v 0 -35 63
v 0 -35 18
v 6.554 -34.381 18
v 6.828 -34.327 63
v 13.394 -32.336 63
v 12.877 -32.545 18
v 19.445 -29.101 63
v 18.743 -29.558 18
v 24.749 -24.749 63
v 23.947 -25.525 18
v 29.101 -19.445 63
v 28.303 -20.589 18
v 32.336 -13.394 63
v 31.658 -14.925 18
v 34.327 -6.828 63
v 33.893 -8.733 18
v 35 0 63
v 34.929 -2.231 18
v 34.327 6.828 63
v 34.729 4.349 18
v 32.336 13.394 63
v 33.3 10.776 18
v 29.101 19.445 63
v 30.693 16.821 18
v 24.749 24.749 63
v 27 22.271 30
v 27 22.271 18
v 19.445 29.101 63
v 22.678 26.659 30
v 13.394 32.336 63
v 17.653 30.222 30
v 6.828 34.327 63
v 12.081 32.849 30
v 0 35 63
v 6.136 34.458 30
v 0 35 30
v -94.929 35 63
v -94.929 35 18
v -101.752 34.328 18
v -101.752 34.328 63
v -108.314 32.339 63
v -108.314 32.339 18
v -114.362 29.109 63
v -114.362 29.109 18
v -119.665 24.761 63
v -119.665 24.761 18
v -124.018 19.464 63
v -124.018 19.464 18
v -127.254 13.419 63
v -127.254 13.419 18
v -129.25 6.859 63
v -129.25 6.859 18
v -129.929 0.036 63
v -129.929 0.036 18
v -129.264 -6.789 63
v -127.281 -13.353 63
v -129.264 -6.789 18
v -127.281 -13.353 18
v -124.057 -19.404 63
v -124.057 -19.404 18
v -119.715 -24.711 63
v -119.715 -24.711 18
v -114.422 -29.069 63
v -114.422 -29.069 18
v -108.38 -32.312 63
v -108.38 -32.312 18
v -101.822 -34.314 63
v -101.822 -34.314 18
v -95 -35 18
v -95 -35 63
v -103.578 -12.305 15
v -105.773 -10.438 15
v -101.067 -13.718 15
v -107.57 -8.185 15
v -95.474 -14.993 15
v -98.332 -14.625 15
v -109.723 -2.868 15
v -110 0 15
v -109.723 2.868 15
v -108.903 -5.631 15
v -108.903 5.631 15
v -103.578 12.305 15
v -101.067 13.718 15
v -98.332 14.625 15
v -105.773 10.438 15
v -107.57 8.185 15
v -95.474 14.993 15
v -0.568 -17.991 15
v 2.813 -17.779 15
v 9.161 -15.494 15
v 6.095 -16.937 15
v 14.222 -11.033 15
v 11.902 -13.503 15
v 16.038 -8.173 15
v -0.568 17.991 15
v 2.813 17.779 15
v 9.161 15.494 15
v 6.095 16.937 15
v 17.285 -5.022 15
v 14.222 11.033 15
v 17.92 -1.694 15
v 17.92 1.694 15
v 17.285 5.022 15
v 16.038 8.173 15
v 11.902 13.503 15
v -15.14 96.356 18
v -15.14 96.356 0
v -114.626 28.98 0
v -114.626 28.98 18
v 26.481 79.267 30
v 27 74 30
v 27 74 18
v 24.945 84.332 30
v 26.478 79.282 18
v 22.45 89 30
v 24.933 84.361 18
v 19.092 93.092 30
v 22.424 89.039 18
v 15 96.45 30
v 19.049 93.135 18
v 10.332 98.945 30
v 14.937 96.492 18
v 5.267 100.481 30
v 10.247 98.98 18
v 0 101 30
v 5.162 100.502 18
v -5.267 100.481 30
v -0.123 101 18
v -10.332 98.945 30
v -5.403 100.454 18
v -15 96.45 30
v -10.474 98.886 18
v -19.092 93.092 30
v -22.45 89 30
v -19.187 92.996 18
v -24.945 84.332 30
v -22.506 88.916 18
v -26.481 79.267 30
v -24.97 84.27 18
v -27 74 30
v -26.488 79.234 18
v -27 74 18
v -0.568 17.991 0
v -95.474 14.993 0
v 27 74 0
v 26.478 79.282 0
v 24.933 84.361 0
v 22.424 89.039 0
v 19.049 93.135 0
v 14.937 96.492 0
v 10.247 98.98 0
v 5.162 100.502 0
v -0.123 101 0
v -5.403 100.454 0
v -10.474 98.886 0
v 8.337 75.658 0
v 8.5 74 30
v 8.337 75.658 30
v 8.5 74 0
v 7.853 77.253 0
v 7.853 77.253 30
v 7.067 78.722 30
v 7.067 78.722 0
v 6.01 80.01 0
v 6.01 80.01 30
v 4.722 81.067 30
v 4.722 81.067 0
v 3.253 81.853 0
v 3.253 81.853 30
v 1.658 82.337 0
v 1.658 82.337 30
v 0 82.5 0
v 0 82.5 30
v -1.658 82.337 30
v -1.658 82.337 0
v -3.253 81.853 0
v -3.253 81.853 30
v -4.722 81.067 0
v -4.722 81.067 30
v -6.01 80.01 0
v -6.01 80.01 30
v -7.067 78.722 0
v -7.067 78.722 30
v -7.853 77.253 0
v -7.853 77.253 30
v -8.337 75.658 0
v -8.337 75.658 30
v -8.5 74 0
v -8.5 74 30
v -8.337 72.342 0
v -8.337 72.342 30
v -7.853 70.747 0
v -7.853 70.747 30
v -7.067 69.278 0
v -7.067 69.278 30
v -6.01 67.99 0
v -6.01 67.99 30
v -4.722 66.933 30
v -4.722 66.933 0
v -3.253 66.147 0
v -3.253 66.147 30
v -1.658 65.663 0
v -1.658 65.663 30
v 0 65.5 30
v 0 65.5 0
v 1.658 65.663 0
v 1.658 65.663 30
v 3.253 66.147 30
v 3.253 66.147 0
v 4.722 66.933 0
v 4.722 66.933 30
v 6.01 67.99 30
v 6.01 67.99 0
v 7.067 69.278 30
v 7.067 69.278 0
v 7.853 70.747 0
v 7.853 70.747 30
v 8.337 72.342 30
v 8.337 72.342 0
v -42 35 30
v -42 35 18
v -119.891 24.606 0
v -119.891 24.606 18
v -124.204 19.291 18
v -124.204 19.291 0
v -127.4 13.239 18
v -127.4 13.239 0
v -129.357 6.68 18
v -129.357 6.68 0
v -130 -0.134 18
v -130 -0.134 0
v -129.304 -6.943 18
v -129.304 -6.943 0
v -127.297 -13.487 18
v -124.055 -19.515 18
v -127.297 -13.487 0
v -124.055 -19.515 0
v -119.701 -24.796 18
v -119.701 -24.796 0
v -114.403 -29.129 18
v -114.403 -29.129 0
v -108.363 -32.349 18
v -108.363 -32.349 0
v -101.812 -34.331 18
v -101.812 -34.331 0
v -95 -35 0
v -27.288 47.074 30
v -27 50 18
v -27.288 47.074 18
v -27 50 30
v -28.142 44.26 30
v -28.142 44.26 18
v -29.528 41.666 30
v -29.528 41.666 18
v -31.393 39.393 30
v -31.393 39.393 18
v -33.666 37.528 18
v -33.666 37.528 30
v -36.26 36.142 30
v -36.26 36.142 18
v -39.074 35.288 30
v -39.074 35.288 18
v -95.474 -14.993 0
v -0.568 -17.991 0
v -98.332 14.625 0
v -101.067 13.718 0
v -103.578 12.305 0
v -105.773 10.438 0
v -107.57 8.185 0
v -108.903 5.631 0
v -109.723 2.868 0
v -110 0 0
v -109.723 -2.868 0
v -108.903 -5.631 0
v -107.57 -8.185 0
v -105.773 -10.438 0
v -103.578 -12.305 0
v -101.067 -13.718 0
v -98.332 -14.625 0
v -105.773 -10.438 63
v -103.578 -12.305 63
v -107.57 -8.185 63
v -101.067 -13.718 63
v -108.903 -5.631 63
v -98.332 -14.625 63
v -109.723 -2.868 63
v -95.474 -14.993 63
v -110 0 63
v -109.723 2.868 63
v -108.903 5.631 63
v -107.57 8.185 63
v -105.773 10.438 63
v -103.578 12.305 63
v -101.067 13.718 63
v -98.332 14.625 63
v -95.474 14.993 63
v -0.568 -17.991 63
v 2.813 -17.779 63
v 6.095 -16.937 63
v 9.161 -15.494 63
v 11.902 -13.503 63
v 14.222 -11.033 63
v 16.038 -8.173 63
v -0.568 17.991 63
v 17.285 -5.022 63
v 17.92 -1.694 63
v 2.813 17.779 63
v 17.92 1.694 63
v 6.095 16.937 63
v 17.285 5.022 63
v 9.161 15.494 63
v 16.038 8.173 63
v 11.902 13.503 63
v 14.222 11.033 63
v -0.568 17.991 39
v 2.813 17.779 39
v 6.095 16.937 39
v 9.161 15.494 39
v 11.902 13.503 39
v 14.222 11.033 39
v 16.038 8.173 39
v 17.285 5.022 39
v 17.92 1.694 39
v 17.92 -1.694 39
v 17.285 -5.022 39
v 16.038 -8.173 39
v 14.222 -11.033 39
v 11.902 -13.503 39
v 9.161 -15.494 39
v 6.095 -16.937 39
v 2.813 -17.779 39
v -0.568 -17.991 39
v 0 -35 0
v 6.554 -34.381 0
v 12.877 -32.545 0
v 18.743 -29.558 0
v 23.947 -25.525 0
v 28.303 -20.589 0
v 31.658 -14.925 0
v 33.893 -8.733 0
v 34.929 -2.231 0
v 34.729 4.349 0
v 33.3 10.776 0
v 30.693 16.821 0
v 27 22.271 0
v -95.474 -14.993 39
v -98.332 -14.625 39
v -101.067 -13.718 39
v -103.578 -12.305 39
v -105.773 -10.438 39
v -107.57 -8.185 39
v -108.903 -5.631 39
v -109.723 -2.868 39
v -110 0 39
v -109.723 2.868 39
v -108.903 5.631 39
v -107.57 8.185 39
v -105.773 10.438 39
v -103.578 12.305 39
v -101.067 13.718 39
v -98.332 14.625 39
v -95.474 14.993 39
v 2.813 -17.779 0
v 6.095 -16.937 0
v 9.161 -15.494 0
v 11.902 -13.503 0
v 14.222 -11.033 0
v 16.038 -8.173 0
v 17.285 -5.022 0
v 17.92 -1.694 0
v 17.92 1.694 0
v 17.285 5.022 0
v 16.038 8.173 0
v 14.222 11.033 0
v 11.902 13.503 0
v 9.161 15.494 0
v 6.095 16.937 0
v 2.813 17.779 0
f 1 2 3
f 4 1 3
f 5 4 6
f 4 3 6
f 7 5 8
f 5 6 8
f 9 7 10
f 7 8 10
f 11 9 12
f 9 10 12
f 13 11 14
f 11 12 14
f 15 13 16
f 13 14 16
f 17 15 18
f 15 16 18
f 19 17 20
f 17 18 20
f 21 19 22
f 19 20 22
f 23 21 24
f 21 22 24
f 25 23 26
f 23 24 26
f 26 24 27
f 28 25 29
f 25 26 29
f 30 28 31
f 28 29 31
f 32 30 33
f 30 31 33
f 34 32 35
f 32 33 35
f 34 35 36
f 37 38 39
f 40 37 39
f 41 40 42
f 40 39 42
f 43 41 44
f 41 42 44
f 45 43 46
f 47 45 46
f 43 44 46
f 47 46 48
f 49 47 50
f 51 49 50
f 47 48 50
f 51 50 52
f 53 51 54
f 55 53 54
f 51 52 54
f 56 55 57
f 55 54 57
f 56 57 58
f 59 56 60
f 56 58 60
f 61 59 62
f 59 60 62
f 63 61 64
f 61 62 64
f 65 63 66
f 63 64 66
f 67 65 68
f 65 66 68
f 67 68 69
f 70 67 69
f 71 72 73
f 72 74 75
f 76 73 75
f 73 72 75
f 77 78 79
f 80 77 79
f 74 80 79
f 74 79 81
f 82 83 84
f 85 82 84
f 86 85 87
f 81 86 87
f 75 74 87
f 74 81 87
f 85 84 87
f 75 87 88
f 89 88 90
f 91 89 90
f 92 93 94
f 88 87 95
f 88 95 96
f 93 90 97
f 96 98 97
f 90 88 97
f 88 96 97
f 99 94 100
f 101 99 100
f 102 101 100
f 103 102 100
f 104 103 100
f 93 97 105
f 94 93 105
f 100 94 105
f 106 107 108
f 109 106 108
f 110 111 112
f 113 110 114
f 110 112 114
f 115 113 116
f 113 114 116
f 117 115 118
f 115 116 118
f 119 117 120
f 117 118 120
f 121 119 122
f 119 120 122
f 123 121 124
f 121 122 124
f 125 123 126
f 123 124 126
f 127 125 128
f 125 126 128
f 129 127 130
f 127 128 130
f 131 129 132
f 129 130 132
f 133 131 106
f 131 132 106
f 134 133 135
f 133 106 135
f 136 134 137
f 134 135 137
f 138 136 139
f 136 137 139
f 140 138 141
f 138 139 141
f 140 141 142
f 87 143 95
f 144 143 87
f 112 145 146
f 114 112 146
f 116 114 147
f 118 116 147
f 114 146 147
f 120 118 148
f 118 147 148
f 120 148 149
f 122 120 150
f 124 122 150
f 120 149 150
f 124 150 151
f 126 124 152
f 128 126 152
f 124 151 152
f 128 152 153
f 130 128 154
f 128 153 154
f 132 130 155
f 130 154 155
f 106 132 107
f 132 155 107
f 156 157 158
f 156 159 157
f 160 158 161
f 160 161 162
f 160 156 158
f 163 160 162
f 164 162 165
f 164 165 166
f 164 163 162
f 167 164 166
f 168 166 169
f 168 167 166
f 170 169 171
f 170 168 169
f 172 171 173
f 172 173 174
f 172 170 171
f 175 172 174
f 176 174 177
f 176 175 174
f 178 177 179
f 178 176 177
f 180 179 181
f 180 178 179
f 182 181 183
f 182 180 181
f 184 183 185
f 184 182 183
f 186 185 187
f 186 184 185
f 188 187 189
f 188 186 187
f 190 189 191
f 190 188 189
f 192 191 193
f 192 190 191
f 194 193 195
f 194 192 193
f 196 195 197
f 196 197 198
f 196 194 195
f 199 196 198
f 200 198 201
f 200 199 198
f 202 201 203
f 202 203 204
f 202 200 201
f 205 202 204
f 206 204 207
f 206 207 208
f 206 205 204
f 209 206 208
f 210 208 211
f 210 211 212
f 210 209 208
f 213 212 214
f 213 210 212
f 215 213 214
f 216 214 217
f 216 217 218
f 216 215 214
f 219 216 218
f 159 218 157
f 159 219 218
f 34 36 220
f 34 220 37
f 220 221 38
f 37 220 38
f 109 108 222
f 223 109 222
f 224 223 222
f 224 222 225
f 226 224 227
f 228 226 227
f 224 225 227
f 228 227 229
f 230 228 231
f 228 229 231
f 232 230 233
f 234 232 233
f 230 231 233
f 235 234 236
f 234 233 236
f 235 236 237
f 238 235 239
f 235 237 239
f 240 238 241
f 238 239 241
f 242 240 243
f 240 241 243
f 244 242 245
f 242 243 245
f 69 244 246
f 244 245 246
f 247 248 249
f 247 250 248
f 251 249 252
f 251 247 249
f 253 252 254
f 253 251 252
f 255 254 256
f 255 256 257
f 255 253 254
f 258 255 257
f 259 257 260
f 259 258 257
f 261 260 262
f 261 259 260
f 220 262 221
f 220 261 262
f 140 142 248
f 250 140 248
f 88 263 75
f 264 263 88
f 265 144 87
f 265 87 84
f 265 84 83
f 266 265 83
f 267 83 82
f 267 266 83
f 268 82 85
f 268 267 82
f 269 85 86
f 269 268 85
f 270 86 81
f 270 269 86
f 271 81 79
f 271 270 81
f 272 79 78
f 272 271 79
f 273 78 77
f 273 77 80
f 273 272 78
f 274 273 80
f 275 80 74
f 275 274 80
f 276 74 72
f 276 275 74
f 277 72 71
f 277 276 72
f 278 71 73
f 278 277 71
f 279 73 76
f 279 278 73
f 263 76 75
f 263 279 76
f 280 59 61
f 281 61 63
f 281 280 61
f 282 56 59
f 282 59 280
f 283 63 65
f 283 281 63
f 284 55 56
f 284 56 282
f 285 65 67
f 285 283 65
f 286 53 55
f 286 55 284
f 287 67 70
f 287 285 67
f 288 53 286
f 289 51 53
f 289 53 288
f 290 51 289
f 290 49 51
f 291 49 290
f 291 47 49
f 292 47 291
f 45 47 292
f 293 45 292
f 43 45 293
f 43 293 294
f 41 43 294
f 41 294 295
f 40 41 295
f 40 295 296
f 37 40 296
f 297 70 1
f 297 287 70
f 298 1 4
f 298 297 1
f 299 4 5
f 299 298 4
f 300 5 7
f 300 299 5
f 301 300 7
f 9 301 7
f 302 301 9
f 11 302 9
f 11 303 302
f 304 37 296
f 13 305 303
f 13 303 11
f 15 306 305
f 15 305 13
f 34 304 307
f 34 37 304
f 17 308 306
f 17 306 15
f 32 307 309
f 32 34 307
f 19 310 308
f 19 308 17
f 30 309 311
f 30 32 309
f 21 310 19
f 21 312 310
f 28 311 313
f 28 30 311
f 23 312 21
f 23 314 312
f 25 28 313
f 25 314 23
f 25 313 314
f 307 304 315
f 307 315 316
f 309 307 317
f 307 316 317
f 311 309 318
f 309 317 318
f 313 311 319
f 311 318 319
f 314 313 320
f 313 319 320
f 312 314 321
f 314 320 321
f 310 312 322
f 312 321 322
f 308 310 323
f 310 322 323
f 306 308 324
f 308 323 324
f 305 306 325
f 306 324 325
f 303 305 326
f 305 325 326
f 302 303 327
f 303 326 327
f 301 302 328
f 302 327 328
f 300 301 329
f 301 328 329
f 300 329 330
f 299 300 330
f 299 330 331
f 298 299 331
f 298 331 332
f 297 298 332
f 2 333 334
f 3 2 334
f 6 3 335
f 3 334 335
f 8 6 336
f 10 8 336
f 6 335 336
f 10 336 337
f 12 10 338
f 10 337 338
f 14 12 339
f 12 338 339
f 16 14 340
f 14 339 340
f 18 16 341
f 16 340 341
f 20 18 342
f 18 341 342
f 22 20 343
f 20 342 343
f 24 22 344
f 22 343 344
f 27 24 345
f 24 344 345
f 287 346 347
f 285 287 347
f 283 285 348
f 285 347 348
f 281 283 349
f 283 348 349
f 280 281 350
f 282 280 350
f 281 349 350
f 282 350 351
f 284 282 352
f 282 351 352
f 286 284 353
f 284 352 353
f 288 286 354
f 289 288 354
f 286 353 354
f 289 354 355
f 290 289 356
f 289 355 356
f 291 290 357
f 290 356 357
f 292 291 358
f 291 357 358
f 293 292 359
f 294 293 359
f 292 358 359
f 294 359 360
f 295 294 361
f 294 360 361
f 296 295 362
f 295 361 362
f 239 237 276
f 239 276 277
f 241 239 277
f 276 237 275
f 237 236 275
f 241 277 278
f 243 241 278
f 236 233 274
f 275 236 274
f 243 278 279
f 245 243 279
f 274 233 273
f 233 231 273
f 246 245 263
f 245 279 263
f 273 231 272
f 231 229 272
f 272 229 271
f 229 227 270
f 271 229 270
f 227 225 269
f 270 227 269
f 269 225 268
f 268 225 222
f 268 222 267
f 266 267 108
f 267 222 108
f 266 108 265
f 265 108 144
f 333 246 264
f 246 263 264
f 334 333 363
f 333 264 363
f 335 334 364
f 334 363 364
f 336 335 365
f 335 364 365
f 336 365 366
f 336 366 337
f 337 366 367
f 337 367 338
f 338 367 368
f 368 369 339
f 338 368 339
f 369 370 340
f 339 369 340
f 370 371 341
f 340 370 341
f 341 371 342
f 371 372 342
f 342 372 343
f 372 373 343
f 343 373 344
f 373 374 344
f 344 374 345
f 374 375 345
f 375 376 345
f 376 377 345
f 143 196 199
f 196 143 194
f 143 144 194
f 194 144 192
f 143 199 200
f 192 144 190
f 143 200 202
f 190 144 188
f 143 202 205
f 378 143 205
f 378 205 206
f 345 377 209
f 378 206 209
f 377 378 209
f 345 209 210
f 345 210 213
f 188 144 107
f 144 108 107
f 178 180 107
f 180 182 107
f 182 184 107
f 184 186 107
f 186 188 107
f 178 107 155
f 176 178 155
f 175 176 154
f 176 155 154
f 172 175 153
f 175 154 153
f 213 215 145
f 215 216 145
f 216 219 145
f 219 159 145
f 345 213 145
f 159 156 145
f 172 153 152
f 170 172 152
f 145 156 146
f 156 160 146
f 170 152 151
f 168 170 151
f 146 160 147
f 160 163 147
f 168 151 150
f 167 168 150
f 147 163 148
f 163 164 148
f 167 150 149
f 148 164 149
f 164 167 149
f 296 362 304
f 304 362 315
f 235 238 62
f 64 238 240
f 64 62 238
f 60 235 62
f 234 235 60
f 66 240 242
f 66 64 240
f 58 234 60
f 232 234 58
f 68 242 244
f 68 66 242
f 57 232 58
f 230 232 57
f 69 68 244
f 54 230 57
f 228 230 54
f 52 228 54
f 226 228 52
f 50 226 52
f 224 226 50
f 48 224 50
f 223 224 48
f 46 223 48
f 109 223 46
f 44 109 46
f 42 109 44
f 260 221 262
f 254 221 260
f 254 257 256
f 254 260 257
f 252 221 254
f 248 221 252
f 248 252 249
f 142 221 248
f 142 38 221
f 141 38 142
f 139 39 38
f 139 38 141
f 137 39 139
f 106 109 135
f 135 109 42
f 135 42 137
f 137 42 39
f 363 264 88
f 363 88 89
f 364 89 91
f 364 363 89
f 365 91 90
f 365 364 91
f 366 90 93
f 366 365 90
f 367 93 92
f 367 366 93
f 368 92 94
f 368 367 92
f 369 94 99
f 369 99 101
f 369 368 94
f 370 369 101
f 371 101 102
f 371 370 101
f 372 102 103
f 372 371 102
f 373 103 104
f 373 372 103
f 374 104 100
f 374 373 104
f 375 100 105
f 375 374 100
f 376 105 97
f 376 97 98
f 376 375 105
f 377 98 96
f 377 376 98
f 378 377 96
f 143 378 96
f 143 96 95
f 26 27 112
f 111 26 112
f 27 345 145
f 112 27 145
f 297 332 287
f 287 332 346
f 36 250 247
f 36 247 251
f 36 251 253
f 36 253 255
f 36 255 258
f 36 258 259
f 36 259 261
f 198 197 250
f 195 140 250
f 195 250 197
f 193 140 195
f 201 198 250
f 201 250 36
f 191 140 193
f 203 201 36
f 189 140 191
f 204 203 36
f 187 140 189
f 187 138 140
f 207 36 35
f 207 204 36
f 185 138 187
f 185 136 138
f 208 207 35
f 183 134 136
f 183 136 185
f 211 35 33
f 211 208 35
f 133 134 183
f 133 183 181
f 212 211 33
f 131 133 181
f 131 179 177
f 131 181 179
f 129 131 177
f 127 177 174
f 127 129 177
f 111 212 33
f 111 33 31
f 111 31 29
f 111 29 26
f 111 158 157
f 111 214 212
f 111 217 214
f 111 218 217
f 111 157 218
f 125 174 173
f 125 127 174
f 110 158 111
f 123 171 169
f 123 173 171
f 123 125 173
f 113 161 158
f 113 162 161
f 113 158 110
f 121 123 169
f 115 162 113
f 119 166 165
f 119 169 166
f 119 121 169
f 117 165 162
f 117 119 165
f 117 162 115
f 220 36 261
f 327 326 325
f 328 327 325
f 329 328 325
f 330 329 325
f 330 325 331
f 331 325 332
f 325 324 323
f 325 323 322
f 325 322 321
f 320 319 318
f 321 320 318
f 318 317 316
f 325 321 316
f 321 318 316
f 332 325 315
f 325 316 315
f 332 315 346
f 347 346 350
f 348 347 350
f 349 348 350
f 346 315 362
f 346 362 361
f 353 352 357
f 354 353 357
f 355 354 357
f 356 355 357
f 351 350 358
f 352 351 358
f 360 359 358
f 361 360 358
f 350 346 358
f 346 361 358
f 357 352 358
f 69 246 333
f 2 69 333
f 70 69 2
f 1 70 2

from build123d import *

# Parameters (mm, degrees)
SKETCH1_R           = 8.5
BASE_DEPTH          = 18
BACK_CUT_DEPTH      = 15
BOSS_EXTRUDE2_DEPTH = 45
SKETCH5_R           = 8.5
BOSS_EXTRUDE4_DEPTH = 12
FILLET1_R           = 15
CUT_EXTRUDE2_START  = -24
CUT_EXTRUDE2_DEPTH  = 24


# Read off the part's stored shape, not the designer's step: Boss-Extrude2
with BuildPart() as part:
    # Sketch1 → base (new body)
    with BuildSketch(Plane.XY):
        with BuildLine():
            Line((-95, -35), (0, -35))
            ThreePointArc((0, -35), (31.658229663, -14.925029132), (27, 22.271057451))
            Line((27, 22.271057451), (27, 74))
            ThreePointArc((27, 74), (12.653359163, 97.8514675), (-15.140185324, 96.355643322))
            Line((-15.140185324, 96.355643322), (-114.626166161, 28.97953764))
            ThreePointArc((-114.626166161, 28.97953764), (-128.461050621, -10.26440896), (-95, -35))
        make_face()
        with Locations((0, 74)):
            Circle(SKETCH1_R, mode=Mode.SUBTRACT)
    extrude(amount=BASE_DEPTH)

    # Sketch3 → back cut (cut)
    with BuildSketch(Plane(origin=(0, 0, 0), x_dir=(-1, 0, 0), z_dir=(0, 0, -1))):
        with BuildLine():
            Line((0.568421053, 17.991022692), (95.473684211, 14.99251891))
            ThreePointArc((95.473684211, 14.99251891), (110, 0), (95.473684211, -14.99251891))
            Line((95.473684211, -14.99251891), (0.568421053, -17.991022692))
            ThreePointArc((0.568421053, -17.991022692), (-18, 0), (0.568421053, 17.991022692))
        make_face()
    extrude(amount=-BACK_CUT_DEPTH, mode=Mode.SUBTRACT)

    # Boss-Extrude2 outline → Boss-Extrude2 (add)
    with BuildSketch(Plane.XY.offset(18)):
        with BuildLine():
            Line((-94.999999851, -34.999927116), (0, -35))
            ThreePointArc((0, -35), (35, 0), (0, 35))
            Line((0, 35), (-94.928572613, 35))
            ThreePointArc((-94.928572613, 35), (-129.928554392, 0.035713638), (-94.999999851, -34.999927116))
        make_face()
    extrude(amount=BOSS_EXTRUDE2_DEPTH)

    # Sketch5 → Boss-Extrude4 (add)
    with BuildSketch(Plane.XY.offset(18)):
        with BuildLine():
            Line((-27, 74), (-27, 35))
            Line((-27, 35), (0, 35))
            ThreePointArc((0, 35), (14.925029132, 31.658229663), (27, 22.271057451))
            Line((27, 22.271057451), (27, 74))
            ThreePointArc((27, 74), (0, 101), (-27, 74))
        make_face()
        with Locations((0, 74)):
            Circle(SKETCH5_R, mode=Mode.SUBTRACT)
    extrude(amount=BOSS_EXTRUDE4_DEPTH)

    # Fillet1
    fillet1_edges = [part.edges().sort_by_distance(p)[0] for p in [
        (-27, 35, 24),
    ]]
    fillet(fillet1_edges, radius=FILLET1_R)

    # Sketch6 → Cut-Extrude2 (cut)
    with BuildSketch(Plane.XY.offset(63).offset(CUT_EXTRUDE2_START)):
        with BuildLine():
            Line((-95.473684211, 14.99251891), (-0.568421053, 17.991022692))
            ThreePointArc((-0.568421053, 17.991022692), (18, 0), (-0.568421053, -17.991022692))
            Line((-0.568421053, -17.991022692), (-95.473684211, -14.99251891))
            ThreePointArc((-95.473684211, -14.99251891), (-110, 0), (-95.473684211, 14.99251891))
        make_face()
    extrude(amount=CUT_EXTRUDE2_DEPTH, mode=Mode.SUBTRACT)


solid = part.part
